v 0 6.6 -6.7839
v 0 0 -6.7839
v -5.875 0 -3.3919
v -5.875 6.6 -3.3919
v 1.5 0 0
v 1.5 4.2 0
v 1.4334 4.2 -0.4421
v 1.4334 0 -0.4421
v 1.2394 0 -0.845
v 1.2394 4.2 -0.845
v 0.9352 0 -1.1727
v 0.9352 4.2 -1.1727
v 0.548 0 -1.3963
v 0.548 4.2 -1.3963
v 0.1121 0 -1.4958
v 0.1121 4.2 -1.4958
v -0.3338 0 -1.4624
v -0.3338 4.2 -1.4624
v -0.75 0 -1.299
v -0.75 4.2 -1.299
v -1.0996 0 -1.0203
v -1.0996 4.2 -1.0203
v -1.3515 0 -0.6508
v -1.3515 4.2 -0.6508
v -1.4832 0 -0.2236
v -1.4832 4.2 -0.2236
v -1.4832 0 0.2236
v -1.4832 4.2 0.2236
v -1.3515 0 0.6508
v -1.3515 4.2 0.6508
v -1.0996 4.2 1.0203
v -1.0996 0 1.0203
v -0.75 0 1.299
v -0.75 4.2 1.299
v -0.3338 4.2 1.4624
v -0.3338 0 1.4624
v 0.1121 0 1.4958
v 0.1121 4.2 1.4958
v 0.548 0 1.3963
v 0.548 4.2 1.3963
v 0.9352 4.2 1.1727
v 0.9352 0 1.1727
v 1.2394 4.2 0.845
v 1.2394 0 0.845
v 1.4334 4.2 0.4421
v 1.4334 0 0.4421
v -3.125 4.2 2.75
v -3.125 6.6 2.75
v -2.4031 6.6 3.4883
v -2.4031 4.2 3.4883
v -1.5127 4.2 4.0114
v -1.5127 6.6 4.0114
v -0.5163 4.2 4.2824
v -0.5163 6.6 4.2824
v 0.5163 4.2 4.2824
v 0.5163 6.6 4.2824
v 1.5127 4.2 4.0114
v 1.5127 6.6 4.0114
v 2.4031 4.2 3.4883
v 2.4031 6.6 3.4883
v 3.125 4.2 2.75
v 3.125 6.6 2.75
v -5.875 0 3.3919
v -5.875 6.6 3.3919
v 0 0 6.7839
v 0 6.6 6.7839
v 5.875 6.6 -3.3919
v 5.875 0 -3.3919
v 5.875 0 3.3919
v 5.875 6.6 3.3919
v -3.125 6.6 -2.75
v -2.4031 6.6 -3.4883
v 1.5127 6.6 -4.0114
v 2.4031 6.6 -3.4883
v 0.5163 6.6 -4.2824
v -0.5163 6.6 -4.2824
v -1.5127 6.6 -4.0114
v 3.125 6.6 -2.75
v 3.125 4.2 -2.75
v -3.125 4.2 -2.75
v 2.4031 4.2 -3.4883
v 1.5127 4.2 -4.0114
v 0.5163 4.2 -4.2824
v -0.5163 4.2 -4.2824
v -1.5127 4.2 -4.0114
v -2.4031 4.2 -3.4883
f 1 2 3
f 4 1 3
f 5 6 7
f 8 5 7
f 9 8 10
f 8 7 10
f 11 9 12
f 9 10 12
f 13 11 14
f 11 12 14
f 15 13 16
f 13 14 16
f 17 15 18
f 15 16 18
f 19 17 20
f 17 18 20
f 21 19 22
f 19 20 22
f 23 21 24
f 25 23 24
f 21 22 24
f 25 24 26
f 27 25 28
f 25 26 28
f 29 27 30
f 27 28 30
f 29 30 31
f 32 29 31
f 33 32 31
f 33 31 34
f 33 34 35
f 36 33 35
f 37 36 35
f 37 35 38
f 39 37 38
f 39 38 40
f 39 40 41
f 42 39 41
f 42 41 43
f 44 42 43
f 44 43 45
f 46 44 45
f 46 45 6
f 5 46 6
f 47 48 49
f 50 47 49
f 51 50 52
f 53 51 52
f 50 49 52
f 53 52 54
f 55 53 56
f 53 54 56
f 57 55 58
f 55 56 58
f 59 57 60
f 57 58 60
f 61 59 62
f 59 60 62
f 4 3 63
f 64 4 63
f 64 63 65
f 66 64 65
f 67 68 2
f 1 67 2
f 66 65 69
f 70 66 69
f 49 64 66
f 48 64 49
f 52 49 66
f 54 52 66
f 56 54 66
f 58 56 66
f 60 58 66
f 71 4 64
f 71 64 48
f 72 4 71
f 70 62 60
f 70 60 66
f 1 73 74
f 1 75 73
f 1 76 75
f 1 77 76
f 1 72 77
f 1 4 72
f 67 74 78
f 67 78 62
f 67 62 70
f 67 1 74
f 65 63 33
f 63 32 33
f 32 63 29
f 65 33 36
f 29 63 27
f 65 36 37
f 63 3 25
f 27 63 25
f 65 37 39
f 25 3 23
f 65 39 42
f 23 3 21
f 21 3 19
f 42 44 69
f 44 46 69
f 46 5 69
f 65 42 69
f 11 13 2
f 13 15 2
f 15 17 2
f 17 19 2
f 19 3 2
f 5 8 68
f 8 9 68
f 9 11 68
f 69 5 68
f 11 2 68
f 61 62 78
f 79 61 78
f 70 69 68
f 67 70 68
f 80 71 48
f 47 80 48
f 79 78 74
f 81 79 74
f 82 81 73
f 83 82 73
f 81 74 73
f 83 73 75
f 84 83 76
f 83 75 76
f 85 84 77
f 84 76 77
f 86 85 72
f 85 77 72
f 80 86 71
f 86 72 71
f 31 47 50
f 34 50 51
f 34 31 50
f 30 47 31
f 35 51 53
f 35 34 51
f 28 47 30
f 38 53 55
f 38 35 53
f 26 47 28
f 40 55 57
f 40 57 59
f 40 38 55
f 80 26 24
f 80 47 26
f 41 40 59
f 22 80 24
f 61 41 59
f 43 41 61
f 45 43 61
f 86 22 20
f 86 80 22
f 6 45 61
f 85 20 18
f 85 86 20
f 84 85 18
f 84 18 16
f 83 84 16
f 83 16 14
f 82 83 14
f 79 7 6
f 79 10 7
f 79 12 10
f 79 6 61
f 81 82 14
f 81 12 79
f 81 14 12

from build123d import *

# Parameters (mm, degrees)
BOSS_EXTRUDE1_DEPTH   = 6.6
CUT_EXTRUDE1_DEPTH    = 2.4
F_3_0MM_DOWEL_HOLE1_D = 3


with BuildPart() as part:
    # Sketch1 → Boss-Extrude1 (new body)
    with BuildSketch(Plane(origin=(0, 0, 0), x_dir=(1, 0, 0), z_dir=(0, 1, 0))):
        Polygon((-5.875, 3.391932831), (-5.875, -3.391932831), (0, -6.783865663), (5.875, -3.391932831), (5.875, 3.391932831), (0, 6.783865663), align=None)
    extrude(amount=BOSS_EXTRUDE1_DEPTH)

    # Sketch2 → Cut-Extrude1 (cut)
    with BuildSketch(Plane(origin=(0, 6.6, 0), x_dir=(1, 0, 0), z_dir=(0, 1, 0))):
        with BuildLine():
            Line((-3.125, 2.75), (-3.125, -2.75))
            ThreePointArc((-3.125, -2.75), (0, -4.316681548), (3.125, -2.75))
            Line((3.125, -2.75), (3.125, 2.75))
            ThreePointArc((3.125, 2.75), (0, 4.316681548), (-3.125, 2.75))
        make_face()
    extrude(amount=-CUT_EXTRUDE1_DEPTH, mode=Mode.SUBTRACT)

    # Ø3.0mm Dowel Hole1 (through all)
    with Locations(Plane(origin=(0, 0, 0), x_dir=(-1, 0, 0), z_dir=(0, -1, 0))):
        with Locations((0, 0)):
            Hole(F_3_0MM_DOWEL_HOLE1_D / 2)


solid = part.part
